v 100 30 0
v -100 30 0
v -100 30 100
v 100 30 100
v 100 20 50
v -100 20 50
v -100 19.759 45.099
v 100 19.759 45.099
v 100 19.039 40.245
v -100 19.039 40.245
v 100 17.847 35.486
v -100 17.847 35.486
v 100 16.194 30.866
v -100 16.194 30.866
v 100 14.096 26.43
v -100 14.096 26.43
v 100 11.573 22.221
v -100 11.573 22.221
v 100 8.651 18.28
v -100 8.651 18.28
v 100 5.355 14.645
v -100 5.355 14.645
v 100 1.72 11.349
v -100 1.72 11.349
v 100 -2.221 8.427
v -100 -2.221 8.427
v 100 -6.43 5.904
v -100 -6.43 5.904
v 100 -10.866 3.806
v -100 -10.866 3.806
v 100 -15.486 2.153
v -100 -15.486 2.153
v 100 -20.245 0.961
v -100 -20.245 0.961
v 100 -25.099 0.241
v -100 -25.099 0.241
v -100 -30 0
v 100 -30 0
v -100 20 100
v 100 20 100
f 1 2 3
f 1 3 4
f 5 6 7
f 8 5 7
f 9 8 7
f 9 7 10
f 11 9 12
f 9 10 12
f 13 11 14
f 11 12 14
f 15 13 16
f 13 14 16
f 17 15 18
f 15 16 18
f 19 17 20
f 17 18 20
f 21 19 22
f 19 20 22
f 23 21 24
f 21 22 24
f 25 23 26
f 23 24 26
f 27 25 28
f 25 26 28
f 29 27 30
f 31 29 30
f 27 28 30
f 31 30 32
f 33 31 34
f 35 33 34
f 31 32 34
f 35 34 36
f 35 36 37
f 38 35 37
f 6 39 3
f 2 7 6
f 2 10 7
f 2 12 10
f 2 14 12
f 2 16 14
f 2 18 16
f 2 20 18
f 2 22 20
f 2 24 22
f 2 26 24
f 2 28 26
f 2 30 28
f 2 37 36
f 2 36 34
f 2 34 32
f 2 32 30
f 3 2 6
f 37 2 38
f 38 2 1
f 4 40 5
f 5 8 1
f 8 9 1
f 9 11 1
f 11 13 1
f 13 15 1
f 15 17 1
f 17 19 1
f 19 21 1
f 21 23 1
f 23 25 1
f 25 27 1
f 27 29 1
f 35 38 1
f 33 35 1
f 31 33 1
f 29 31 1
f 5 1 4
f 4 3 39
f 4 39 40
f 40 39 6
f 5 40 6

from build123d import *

# Parameters (mm, degrees)
F0_W     = 200
F0_H     = 60
F1_DEPTH = 100
F3_DEPTH = 200


with BuildPart() as f1:
    # F0 (on Top) → F1 (new body)
    with BuildSketch(Plane.XY):
        Rectangle(F0_W, F0_H)
    extrude(amount=F1_DEPTH)

    # F2 (on face) → F3 (cut)
    with BuildSketch(Plane(origin=(-100, 0, 0), x_dir=(0, -1, 0), z_dir=(-1, 0, 0))):
        with BuildLine():
            Line((30, 100), (-20, 100))
            Line((-20, 100), (-20, 50))
            ThreePointArc((-20, 50), (-5.355339, 14.644661), (30, 0))
            Line((30, 0), (30, 100))
        make_face()
    extrude(amount=-F3_DEPTH, mode=Mode.SUBTRACT)


solid = f1.part
